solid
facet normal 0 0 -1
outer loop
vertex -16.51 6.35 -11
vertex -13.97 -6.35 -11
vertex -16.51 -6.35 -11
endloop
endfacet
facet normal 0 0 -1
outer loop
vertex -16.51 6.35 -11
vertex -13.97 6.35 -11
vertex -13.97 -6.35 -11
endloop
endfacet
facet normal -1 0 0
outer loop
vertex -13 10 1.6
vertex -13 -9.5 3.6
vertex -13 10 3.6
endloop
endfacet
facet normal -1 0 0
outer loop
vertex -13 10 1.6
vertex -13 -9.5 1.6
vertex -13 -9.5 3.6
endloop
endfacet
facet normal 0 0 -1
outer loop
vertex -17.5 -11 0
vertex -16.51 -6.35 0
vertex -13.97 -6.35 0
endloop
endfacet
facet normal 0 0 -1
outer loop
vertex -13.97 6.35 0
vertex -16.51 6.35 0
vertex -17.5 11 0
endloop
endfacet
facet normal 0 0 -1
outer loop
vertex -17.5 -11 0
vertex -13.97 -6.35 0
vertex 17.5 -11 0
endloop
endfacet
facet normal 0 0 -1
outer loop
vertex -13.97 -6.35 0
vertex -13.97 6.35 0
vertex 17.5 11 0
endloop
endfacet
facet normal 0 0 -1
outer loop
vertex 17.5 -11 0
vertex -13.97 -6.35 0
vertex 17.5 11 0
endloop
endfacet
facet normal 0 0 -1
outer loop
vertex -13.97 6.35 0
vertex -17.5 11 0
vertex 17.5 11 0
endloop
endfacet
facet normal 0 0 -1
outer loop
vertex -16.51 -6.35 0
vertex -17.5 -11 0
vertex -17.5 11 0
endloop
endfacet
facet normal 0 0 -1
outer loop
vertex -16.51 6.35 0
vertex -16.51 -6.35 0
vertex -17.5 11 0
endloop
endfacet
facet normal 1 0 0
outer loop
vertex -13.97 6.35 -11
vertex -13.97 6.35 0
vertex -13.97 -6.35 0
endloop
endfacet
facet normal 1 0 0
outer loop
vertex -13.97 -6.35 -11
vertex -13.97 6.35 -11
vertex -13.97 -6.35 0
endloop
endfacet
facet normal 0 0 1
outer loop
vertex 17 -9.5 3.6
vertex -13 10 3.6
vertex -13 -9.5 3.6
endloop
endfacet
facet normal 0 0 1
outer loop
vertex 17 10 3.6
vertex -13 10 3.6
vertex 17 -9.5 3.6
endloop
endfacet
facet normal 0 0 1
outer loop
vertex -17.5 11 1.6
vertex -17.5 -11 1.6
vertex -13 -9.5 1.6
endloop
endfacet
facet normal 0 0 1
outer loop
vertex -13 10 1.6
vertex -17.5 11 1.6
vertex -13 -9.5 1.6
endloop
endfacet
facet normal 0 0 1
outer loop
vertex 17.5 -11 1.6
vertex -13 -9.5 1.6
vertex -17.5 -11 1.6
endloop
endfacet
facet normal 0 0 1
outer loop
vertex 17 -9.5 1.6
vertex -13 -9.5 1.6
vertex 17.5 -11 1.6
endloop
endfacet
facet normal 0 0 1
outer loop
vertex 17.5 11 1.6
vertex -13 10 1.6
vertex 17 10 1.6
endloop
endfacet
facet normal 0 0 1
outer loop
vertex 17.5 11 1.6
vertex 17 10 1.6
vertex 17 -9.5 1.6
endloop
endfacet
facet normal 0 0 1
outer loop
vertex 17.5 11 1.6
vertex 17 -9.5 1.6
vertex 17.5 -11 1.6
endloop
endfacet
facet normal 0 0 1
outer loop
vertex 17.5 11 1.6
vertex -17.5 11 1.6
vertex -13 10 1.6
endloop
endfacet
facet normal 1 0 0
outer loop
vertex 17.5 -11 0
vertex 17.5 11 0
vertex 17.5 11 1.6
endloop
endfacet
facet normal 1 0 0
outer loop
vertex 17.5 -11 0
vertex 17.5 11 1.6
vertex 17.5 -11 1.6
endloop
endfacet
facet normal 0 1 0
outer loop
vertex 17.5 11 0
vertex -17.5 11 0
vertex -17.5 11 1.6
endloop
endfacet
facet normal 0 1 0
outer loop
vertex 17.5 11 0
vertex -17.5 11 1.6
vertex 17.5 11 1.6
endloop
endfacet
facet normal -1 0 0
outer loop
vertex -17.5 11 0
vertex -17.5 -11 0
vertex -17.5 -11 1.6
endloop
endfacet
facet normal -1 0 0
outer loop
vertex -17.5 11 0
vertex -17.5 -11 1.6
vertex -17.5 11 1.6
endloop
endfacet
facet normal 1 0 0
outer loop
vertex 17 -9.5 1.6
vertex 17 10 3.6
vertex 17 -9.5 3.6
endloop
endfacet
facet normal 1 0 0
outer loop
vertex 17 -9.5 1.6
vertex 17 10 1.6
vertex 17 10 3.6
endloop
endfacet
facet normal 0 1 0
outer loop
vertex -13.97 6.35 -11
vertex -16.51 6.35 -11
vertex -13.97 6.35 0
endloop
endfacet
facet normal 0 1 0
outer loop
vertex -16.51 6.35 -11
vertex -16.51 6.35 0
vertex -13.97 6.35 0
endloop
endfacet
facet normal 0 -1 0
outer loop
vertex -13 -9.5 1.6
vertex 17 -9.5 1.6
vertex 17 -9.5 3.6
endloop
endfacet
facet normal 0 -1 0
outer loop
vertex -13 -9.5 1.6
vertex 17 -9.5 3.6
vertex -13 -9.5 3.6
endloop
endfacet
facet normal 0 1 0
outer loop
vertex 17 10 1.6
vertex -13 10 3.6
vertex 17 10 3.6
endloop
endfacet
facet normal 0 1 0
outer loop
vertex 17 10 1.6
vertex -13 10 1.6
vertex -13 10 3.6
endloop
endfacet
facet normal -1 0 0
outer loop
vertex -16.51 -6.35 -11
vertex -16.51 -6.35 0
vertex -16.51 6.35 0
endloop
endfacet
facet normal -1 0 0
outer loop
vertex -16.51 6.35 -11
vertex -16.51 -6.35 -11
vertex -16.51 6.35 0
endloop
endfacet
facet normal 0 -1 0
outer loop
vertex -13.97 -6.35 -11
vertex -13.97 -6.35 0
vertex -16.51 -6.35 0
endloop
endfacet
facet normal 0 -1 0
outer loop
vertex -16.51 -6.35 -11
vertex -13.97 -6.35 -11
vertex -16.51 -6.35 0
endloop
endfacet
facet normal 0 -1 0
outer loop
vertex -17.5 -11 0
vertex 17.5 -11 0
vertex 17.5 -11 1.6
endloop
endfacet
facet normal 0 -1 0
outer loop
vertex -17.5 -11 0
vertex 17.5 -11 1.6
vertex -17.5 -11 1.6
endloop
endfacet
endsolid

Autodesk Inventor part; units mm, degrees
ref_plane "YZ Plane" through (0, 0, 0) normal (1, 0, 0) x (0, 1, 0)
ref_plane "XZ Plane" through (0, 0, 0) normal (0, 1, 0) x (-1, 0, 0)
ref_plane "XY Plane" through (0, 0, 0) normal (0, 0, 1) x (1, 0, 0)
sketch "スケッチ1" plane through (0, 0, 0) normal (0, 0, 1) x (1, 0, 0)
  line L0 (-17.5, 11) -> (17.5, 11)
  line L1 (17.5, 11) -> (17.5, -11)
  line L2 (17.5, -11) -> (-17.5, -11)
  line L3 (-17.5, -11) -> (-17.5, 11)
  point P0 (0, 0)
  point P1 (-17.5, 0)
  point P2 (0, 11)
  dimension "d0" = 35
  dimension "d1" = 22
extrude "押し出し1" add sketch "スケッチ1" along normal blind 1.6
sketch "スケッチ2" plane through (0, 0, 0) normal (0, 0, -1) x (-1, 0, 0)
  line L0 (15.24, 13.4783) -> (15.24, -13.8825) construction
  line L1 (17.5, 11) -> (17.5, -11) construction
  line L2 (18.6717, -5.08) -> (13.4177, -5.08) construction
  line L3 (17.5, -11) -> (-17.5, -11) construction
  line L4 (13.97, -6.35) -> (16.51, -6.35)
  line L5 (16.51, -6.35) -> (16.51, 6.35)
  line L6 (16.51, 6.35) -> (13.97, 6.35)
  line L7 (13.97, 6.35) -> (13.97, -6.35)
  point P0 (0, 0)
  point P1 (15.24, -6.35)
  dimension "d4" = 2.26
  dimension "d5" = 5.92
  dimension "d6" = 2.54
  dimension "d7" = 1.27
  dimension "d8" = 12.7
extrude "押し出し2" add sketch "スケッチ2" along normal blind 11
sketch "スケッチ3" plane through (0, 0, 1.6) normal (0, 0, 1) x (1, 0, 0)
  line L0 (-13, 10) -> (17, 10)
  line L1 (17, 10) -> (17, -9.5)
  line L2 (17, -9.5) -> (-13, -9.5)
  line L3 (-13, -9.5) -> (-13, 10)
  line L4 (17.5, 11) -> (-17.5, 11) projected
  line L5 (17.5, -11) -> (17.5, 11) projected
  point P0 (0, 0)
  dimension "d11" = 30
  dimension "d12" = 19.5
  dimension "d13" = 1
  dimension "d14" = 0.5
extrude "押し出し3" add sketch "スケッチ3" along normal blind 2
properties part number "PCB-AE-AQM0802"
